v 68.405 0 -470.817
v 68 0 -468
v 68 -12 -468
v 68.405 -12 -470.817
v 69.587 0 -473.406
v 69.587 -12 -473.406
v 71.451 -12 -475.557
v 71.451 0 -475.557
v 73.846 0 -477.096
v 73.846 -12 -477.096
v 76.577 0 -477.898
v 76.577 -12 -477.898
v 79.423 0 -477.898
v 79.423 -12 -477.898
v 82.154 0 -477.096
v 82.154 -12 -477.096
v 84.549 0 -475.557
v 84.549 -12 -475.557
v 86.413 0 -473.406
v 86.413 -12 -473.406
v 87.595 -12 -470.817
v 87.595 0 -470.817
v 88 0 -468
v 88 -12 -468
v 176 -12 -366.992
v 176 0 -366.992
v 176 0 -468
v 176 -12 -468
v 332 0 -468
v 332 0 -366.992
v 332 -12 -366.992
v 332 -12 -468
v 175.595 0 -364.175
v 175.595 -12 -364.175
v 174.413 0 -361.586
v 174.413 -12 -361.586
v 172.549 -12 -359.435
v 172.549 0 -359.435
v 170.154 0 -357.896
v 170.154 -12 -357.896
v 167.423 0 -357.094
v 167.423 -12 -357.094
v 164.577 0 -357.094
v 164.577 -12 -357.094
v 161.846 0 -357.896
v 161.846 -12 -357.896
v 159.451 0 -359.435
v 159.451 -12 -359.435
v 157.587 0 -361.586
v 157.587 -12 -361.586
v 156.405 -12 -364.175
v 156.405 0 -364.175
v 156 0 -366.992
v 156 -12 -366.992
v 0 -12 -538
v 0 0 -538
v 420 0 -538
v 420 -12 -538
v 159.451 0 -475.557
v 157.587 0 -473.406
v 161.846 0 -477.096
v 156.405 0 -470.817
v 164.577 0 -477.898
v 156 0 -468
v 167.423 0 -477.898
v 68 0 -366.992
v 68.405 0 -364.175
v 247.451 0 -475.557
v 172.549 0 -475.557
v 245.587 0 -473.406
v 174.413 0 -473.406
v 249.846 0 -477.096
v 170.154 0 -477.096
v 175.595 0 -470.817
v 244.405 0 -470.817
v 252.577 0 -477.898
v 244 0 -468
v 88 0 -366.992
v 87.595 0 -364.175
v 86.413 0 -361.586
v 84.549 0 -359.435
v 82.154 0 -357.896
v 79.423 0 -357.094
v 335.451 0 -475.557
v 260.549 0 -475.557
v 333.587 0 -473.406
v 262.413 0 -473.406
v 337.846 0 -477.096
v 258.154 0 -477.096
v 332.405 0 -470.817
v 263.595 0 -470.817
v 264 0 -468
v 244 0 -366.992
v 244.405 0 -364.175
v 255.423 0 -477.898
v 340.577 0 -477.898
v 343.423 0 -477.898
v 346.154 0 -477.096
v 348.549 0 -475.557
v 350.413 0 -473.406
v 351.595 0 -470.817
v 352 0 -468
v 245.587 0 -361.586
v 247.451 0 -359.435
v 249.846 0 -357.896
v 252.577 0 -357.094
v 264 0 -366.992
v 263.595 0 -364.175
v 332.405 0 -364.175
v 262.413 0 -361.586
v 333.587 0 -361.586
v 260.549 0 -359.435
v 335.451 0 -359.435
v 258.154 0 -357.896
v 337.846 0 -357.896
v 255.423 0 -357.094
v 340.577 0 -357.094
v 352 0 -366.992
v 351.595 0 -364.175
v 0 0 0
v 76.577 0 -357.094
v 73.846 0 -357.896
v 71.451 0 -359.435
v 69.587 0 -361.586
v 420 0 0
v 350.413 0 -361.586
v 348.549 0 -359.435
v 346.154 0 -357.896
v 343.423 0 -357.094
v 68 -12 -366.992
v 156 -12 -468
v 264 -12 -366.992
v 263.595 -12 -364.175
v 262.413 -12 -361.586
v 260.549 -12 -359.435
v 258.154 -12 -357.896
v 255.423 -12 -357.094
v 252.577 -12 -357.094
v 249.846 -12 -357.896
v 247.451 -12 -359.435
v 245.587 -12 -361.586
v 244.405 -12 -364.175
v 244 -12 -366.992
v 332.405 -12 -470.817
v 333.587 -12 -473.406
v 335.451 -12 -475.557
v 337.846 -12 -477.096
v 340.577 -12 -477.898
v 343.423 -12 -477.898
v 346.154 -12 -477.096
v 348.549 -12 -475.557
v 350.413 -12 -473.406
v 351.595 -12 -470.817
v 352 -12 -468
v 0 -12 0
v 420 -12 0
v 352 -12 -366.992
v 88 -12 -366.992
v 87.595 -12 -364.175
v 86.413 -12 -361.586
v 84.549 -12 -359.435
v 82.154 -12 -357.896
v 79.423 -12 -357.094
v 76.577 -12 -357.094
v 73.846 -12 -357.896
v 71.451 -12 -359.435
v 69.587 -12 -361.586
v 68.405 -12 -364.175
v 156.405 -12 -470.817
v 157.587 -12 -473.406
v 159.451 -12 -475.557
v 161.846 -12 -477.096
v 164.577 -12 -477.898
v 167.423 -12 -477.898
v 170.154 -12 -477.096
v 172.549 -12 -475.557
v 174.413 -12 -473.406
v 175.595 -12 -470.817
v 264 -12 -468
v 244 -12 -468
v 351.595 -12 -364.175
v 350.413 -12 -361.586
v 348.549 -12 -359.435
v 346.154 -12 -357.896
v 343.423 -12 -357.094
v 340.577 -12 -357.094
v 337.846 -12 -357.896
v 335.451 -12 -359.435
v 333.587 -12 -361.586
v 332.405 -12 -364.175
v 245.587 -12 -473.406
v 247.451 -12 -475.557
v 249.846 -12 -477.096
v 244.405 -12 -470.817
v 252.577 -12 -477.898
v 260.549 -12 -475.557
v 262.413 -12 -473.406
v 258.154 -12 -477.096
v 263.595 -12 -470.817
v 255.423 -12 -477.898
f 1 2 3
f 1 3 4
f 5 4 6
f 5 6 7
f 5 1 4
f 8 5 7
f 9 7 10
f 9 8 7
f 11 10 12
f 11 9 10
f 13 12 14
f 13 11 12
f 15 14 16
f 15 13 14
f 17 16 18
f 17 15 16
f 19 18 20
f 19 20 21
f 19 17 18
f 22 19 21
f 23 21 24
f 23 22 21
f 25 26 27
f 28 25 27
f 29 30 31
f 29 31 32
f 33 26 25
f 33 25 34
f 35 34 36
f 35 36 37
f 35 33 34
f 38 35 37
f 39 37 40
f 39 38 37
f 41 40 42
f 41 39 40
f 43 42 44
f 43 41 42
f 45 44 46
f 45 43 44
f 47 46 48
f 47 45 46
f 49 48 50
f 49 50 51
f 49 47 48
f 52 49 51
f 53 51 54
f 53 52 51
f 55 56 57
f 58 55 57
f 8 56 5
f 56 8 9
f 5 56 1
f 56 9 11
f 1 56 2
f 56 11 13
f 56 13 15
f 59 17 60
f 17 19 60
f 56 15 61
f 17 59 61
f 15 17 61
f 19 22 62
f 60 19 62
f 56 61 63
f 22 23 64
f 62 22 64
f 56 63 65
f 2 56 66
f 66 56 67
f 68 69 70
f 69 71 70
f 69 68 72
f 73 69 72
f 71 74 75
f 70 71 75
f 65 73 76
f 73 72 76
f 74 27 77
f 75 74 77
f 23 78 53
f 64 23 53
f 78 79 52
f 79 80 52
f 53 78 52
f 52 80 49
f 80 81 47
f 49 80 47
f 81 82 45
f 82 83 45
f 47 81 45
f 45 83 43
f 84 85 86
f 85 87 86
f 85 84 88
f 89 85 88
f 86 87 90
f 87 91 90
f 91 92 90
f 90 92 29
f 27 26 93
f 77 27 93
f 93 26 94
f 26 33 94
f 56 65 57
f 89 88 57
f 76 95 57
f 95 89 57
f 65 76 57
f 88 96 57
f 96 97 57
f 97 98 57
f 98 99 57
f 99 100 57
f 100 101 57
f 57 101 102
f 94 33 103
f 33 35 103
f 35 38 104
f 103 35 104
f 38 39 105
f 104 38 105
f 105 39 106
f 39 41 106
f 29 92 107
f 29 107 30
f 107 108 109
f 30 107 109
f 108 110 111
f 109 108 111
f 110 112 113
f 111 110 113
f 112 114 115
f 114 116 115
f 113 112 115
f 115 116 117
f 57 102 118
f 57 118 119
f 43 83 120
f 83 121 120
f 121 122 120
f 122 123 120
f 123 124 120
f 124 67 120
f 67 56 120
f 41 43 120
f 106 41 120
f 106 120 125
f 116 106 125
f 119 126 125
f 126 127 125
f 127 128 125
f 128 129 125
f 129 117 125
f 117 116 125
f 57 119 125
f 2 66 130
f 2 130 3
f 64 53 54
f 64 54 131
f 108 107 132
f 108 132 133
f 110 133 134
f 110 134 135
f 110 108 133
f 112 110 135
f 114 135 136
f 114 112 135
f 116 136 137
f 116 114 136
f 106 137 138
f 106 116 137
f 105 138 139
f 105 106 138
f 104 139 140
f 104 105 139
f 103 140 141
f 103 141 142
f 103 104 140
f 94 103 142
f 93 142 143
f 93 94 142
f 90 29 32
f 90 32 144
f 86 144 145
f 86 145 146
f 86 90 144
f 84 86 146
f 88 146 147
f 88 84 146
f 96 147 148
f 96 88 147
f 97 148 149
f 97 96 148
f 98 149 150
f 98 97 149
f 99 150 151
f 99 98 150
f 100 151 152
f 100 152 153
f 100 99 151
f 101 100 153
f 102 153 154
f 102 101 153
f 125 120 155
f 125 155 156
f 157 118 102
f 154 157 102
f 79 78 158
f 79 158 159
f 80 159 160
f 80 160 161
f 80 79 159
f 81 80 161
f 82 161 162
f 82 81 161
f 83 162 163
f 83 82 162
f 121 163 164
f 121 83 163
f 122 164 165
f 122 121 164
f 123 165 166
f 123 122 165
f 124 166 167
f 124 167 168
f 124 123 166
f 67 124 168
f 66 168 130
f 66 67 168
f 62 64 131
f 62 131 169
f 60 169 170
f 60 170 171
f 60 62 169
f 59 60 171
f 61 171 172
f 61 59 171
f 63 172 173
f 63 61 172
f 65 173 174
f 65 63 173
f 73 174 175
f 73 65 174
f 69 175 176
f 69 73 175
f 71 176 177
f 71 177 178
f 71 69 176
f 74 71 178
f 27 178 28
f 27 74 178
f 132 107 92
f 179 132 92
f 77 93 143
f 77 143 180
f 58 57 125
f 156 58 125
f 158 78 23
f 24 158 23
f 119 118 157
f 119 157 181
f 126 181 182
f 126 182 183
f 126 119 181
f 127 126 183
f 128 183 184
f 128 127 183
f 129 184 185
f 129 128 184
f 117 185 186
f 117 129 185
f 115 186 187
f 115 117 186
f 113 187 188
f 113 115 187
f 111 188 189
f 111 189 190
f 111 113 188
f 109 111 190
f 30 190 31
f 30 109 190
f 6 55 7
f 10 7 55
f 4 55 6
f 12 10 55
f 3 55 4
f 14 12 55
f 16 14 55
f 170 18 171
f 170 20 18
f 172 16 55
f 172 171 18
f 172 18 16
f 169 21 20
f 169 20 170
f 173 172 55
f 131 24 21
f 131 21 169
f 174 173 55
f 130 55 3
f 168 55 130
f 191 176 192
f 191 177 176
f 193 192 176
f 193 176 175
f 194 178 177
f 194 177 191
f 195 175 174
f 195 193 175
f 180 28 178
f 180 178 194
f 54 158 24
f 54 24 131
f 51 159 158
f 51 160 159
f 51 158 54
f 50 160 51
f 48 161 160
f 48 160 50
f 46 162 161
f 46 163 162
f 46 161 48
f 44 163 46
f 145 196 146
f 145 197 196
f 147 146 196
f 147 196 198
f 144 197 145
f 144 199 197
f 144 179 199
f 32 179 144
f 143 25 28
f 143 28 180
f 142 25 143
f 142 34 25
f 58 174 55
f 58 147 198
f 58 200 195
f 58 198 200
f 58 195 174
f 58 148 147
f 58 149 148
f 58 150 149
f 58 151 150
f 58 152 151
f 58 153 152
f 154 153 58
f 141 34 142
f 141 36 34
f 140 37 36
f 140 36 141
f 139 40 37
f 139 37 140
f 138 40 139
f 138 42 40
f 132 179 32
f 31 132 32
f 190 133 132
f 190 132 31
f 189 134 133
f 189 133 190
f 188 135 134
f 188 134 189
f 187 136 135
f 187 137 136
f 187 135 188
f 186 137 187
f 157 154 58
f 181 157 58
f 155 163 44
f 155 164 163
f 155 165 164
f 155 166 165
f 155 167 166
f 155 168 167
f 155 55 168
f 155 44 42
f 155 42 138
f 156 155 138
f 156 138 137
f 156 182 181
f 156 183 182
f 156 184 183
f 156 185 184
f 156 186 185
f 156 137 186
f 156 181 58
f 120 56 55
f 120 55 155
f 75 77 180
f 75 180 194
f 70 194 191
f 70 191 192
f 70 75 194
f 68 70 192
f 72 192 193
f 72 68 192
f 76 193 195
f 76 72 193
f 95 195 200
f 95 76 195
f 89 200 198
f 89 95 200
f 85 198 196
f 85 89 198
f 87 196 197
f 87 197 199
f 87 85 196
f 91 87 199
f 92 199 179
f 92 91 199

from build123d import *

# Parameters (mm, degrees)
SKETCH_W  = 420
SKETCH_H  = 538
PAD_DEPTH = 12


with BuildPart() as part:
    # Sketch → Pad (new body)
    with BuildSketch(Plane.XZ):
        with Locations((210, -269)):
            Rectangle(SKETCH_W, SKETCH_H)
        with BuildLine():
            ThreePointArc((88, -366.992235), (78, -356.992235), (68, -366.992235))
            Line((68, -366.992235), (68, -468))
            ThreePointArc((68, -468), (78, -478), (88, -468))
            Line((88, -366.992235), (88, -468))
        make_face(mode=Mode.SUBTRACT)
        with BuildLine():
            ThreePointArc((264, -366.992235), (254, -356.992235), (244, -366.992235))
            Line((244, -366.992235), (244, -468))
            ThreePointArc((244, -468), (254, -478), (264, -468))
            Line((264, -366.992235), (264, -468))
        make_face(mode=Mode.SUBTRACT)
        with BuildLine():
            ThreePointArc((352, -366.992235), (342, -356.992235), (332, -366.992235))
            Line((332, -366.992235), (332, -468))
            ThreePointArc((332, -468), (342, -478), (352, -468))
            Line((352, -366.992235), (352, -468))
        make_face(mode=Mode.SUBTRACT)
        with BuildLine():
            ThreePointArc((176, -366.992235), (166, -356.992235), (156, -366.992235))
            Line((156, -366.992235), (156, -468))
            ThreePointArc((156, -468), (166, -478), (176, -468))
            Line((176, -366.992235), (176, -468))
        make_face(mode=Mode.SUBTRACT)
    extrude(amount=PAD_DEPTH)


solid = part.part
